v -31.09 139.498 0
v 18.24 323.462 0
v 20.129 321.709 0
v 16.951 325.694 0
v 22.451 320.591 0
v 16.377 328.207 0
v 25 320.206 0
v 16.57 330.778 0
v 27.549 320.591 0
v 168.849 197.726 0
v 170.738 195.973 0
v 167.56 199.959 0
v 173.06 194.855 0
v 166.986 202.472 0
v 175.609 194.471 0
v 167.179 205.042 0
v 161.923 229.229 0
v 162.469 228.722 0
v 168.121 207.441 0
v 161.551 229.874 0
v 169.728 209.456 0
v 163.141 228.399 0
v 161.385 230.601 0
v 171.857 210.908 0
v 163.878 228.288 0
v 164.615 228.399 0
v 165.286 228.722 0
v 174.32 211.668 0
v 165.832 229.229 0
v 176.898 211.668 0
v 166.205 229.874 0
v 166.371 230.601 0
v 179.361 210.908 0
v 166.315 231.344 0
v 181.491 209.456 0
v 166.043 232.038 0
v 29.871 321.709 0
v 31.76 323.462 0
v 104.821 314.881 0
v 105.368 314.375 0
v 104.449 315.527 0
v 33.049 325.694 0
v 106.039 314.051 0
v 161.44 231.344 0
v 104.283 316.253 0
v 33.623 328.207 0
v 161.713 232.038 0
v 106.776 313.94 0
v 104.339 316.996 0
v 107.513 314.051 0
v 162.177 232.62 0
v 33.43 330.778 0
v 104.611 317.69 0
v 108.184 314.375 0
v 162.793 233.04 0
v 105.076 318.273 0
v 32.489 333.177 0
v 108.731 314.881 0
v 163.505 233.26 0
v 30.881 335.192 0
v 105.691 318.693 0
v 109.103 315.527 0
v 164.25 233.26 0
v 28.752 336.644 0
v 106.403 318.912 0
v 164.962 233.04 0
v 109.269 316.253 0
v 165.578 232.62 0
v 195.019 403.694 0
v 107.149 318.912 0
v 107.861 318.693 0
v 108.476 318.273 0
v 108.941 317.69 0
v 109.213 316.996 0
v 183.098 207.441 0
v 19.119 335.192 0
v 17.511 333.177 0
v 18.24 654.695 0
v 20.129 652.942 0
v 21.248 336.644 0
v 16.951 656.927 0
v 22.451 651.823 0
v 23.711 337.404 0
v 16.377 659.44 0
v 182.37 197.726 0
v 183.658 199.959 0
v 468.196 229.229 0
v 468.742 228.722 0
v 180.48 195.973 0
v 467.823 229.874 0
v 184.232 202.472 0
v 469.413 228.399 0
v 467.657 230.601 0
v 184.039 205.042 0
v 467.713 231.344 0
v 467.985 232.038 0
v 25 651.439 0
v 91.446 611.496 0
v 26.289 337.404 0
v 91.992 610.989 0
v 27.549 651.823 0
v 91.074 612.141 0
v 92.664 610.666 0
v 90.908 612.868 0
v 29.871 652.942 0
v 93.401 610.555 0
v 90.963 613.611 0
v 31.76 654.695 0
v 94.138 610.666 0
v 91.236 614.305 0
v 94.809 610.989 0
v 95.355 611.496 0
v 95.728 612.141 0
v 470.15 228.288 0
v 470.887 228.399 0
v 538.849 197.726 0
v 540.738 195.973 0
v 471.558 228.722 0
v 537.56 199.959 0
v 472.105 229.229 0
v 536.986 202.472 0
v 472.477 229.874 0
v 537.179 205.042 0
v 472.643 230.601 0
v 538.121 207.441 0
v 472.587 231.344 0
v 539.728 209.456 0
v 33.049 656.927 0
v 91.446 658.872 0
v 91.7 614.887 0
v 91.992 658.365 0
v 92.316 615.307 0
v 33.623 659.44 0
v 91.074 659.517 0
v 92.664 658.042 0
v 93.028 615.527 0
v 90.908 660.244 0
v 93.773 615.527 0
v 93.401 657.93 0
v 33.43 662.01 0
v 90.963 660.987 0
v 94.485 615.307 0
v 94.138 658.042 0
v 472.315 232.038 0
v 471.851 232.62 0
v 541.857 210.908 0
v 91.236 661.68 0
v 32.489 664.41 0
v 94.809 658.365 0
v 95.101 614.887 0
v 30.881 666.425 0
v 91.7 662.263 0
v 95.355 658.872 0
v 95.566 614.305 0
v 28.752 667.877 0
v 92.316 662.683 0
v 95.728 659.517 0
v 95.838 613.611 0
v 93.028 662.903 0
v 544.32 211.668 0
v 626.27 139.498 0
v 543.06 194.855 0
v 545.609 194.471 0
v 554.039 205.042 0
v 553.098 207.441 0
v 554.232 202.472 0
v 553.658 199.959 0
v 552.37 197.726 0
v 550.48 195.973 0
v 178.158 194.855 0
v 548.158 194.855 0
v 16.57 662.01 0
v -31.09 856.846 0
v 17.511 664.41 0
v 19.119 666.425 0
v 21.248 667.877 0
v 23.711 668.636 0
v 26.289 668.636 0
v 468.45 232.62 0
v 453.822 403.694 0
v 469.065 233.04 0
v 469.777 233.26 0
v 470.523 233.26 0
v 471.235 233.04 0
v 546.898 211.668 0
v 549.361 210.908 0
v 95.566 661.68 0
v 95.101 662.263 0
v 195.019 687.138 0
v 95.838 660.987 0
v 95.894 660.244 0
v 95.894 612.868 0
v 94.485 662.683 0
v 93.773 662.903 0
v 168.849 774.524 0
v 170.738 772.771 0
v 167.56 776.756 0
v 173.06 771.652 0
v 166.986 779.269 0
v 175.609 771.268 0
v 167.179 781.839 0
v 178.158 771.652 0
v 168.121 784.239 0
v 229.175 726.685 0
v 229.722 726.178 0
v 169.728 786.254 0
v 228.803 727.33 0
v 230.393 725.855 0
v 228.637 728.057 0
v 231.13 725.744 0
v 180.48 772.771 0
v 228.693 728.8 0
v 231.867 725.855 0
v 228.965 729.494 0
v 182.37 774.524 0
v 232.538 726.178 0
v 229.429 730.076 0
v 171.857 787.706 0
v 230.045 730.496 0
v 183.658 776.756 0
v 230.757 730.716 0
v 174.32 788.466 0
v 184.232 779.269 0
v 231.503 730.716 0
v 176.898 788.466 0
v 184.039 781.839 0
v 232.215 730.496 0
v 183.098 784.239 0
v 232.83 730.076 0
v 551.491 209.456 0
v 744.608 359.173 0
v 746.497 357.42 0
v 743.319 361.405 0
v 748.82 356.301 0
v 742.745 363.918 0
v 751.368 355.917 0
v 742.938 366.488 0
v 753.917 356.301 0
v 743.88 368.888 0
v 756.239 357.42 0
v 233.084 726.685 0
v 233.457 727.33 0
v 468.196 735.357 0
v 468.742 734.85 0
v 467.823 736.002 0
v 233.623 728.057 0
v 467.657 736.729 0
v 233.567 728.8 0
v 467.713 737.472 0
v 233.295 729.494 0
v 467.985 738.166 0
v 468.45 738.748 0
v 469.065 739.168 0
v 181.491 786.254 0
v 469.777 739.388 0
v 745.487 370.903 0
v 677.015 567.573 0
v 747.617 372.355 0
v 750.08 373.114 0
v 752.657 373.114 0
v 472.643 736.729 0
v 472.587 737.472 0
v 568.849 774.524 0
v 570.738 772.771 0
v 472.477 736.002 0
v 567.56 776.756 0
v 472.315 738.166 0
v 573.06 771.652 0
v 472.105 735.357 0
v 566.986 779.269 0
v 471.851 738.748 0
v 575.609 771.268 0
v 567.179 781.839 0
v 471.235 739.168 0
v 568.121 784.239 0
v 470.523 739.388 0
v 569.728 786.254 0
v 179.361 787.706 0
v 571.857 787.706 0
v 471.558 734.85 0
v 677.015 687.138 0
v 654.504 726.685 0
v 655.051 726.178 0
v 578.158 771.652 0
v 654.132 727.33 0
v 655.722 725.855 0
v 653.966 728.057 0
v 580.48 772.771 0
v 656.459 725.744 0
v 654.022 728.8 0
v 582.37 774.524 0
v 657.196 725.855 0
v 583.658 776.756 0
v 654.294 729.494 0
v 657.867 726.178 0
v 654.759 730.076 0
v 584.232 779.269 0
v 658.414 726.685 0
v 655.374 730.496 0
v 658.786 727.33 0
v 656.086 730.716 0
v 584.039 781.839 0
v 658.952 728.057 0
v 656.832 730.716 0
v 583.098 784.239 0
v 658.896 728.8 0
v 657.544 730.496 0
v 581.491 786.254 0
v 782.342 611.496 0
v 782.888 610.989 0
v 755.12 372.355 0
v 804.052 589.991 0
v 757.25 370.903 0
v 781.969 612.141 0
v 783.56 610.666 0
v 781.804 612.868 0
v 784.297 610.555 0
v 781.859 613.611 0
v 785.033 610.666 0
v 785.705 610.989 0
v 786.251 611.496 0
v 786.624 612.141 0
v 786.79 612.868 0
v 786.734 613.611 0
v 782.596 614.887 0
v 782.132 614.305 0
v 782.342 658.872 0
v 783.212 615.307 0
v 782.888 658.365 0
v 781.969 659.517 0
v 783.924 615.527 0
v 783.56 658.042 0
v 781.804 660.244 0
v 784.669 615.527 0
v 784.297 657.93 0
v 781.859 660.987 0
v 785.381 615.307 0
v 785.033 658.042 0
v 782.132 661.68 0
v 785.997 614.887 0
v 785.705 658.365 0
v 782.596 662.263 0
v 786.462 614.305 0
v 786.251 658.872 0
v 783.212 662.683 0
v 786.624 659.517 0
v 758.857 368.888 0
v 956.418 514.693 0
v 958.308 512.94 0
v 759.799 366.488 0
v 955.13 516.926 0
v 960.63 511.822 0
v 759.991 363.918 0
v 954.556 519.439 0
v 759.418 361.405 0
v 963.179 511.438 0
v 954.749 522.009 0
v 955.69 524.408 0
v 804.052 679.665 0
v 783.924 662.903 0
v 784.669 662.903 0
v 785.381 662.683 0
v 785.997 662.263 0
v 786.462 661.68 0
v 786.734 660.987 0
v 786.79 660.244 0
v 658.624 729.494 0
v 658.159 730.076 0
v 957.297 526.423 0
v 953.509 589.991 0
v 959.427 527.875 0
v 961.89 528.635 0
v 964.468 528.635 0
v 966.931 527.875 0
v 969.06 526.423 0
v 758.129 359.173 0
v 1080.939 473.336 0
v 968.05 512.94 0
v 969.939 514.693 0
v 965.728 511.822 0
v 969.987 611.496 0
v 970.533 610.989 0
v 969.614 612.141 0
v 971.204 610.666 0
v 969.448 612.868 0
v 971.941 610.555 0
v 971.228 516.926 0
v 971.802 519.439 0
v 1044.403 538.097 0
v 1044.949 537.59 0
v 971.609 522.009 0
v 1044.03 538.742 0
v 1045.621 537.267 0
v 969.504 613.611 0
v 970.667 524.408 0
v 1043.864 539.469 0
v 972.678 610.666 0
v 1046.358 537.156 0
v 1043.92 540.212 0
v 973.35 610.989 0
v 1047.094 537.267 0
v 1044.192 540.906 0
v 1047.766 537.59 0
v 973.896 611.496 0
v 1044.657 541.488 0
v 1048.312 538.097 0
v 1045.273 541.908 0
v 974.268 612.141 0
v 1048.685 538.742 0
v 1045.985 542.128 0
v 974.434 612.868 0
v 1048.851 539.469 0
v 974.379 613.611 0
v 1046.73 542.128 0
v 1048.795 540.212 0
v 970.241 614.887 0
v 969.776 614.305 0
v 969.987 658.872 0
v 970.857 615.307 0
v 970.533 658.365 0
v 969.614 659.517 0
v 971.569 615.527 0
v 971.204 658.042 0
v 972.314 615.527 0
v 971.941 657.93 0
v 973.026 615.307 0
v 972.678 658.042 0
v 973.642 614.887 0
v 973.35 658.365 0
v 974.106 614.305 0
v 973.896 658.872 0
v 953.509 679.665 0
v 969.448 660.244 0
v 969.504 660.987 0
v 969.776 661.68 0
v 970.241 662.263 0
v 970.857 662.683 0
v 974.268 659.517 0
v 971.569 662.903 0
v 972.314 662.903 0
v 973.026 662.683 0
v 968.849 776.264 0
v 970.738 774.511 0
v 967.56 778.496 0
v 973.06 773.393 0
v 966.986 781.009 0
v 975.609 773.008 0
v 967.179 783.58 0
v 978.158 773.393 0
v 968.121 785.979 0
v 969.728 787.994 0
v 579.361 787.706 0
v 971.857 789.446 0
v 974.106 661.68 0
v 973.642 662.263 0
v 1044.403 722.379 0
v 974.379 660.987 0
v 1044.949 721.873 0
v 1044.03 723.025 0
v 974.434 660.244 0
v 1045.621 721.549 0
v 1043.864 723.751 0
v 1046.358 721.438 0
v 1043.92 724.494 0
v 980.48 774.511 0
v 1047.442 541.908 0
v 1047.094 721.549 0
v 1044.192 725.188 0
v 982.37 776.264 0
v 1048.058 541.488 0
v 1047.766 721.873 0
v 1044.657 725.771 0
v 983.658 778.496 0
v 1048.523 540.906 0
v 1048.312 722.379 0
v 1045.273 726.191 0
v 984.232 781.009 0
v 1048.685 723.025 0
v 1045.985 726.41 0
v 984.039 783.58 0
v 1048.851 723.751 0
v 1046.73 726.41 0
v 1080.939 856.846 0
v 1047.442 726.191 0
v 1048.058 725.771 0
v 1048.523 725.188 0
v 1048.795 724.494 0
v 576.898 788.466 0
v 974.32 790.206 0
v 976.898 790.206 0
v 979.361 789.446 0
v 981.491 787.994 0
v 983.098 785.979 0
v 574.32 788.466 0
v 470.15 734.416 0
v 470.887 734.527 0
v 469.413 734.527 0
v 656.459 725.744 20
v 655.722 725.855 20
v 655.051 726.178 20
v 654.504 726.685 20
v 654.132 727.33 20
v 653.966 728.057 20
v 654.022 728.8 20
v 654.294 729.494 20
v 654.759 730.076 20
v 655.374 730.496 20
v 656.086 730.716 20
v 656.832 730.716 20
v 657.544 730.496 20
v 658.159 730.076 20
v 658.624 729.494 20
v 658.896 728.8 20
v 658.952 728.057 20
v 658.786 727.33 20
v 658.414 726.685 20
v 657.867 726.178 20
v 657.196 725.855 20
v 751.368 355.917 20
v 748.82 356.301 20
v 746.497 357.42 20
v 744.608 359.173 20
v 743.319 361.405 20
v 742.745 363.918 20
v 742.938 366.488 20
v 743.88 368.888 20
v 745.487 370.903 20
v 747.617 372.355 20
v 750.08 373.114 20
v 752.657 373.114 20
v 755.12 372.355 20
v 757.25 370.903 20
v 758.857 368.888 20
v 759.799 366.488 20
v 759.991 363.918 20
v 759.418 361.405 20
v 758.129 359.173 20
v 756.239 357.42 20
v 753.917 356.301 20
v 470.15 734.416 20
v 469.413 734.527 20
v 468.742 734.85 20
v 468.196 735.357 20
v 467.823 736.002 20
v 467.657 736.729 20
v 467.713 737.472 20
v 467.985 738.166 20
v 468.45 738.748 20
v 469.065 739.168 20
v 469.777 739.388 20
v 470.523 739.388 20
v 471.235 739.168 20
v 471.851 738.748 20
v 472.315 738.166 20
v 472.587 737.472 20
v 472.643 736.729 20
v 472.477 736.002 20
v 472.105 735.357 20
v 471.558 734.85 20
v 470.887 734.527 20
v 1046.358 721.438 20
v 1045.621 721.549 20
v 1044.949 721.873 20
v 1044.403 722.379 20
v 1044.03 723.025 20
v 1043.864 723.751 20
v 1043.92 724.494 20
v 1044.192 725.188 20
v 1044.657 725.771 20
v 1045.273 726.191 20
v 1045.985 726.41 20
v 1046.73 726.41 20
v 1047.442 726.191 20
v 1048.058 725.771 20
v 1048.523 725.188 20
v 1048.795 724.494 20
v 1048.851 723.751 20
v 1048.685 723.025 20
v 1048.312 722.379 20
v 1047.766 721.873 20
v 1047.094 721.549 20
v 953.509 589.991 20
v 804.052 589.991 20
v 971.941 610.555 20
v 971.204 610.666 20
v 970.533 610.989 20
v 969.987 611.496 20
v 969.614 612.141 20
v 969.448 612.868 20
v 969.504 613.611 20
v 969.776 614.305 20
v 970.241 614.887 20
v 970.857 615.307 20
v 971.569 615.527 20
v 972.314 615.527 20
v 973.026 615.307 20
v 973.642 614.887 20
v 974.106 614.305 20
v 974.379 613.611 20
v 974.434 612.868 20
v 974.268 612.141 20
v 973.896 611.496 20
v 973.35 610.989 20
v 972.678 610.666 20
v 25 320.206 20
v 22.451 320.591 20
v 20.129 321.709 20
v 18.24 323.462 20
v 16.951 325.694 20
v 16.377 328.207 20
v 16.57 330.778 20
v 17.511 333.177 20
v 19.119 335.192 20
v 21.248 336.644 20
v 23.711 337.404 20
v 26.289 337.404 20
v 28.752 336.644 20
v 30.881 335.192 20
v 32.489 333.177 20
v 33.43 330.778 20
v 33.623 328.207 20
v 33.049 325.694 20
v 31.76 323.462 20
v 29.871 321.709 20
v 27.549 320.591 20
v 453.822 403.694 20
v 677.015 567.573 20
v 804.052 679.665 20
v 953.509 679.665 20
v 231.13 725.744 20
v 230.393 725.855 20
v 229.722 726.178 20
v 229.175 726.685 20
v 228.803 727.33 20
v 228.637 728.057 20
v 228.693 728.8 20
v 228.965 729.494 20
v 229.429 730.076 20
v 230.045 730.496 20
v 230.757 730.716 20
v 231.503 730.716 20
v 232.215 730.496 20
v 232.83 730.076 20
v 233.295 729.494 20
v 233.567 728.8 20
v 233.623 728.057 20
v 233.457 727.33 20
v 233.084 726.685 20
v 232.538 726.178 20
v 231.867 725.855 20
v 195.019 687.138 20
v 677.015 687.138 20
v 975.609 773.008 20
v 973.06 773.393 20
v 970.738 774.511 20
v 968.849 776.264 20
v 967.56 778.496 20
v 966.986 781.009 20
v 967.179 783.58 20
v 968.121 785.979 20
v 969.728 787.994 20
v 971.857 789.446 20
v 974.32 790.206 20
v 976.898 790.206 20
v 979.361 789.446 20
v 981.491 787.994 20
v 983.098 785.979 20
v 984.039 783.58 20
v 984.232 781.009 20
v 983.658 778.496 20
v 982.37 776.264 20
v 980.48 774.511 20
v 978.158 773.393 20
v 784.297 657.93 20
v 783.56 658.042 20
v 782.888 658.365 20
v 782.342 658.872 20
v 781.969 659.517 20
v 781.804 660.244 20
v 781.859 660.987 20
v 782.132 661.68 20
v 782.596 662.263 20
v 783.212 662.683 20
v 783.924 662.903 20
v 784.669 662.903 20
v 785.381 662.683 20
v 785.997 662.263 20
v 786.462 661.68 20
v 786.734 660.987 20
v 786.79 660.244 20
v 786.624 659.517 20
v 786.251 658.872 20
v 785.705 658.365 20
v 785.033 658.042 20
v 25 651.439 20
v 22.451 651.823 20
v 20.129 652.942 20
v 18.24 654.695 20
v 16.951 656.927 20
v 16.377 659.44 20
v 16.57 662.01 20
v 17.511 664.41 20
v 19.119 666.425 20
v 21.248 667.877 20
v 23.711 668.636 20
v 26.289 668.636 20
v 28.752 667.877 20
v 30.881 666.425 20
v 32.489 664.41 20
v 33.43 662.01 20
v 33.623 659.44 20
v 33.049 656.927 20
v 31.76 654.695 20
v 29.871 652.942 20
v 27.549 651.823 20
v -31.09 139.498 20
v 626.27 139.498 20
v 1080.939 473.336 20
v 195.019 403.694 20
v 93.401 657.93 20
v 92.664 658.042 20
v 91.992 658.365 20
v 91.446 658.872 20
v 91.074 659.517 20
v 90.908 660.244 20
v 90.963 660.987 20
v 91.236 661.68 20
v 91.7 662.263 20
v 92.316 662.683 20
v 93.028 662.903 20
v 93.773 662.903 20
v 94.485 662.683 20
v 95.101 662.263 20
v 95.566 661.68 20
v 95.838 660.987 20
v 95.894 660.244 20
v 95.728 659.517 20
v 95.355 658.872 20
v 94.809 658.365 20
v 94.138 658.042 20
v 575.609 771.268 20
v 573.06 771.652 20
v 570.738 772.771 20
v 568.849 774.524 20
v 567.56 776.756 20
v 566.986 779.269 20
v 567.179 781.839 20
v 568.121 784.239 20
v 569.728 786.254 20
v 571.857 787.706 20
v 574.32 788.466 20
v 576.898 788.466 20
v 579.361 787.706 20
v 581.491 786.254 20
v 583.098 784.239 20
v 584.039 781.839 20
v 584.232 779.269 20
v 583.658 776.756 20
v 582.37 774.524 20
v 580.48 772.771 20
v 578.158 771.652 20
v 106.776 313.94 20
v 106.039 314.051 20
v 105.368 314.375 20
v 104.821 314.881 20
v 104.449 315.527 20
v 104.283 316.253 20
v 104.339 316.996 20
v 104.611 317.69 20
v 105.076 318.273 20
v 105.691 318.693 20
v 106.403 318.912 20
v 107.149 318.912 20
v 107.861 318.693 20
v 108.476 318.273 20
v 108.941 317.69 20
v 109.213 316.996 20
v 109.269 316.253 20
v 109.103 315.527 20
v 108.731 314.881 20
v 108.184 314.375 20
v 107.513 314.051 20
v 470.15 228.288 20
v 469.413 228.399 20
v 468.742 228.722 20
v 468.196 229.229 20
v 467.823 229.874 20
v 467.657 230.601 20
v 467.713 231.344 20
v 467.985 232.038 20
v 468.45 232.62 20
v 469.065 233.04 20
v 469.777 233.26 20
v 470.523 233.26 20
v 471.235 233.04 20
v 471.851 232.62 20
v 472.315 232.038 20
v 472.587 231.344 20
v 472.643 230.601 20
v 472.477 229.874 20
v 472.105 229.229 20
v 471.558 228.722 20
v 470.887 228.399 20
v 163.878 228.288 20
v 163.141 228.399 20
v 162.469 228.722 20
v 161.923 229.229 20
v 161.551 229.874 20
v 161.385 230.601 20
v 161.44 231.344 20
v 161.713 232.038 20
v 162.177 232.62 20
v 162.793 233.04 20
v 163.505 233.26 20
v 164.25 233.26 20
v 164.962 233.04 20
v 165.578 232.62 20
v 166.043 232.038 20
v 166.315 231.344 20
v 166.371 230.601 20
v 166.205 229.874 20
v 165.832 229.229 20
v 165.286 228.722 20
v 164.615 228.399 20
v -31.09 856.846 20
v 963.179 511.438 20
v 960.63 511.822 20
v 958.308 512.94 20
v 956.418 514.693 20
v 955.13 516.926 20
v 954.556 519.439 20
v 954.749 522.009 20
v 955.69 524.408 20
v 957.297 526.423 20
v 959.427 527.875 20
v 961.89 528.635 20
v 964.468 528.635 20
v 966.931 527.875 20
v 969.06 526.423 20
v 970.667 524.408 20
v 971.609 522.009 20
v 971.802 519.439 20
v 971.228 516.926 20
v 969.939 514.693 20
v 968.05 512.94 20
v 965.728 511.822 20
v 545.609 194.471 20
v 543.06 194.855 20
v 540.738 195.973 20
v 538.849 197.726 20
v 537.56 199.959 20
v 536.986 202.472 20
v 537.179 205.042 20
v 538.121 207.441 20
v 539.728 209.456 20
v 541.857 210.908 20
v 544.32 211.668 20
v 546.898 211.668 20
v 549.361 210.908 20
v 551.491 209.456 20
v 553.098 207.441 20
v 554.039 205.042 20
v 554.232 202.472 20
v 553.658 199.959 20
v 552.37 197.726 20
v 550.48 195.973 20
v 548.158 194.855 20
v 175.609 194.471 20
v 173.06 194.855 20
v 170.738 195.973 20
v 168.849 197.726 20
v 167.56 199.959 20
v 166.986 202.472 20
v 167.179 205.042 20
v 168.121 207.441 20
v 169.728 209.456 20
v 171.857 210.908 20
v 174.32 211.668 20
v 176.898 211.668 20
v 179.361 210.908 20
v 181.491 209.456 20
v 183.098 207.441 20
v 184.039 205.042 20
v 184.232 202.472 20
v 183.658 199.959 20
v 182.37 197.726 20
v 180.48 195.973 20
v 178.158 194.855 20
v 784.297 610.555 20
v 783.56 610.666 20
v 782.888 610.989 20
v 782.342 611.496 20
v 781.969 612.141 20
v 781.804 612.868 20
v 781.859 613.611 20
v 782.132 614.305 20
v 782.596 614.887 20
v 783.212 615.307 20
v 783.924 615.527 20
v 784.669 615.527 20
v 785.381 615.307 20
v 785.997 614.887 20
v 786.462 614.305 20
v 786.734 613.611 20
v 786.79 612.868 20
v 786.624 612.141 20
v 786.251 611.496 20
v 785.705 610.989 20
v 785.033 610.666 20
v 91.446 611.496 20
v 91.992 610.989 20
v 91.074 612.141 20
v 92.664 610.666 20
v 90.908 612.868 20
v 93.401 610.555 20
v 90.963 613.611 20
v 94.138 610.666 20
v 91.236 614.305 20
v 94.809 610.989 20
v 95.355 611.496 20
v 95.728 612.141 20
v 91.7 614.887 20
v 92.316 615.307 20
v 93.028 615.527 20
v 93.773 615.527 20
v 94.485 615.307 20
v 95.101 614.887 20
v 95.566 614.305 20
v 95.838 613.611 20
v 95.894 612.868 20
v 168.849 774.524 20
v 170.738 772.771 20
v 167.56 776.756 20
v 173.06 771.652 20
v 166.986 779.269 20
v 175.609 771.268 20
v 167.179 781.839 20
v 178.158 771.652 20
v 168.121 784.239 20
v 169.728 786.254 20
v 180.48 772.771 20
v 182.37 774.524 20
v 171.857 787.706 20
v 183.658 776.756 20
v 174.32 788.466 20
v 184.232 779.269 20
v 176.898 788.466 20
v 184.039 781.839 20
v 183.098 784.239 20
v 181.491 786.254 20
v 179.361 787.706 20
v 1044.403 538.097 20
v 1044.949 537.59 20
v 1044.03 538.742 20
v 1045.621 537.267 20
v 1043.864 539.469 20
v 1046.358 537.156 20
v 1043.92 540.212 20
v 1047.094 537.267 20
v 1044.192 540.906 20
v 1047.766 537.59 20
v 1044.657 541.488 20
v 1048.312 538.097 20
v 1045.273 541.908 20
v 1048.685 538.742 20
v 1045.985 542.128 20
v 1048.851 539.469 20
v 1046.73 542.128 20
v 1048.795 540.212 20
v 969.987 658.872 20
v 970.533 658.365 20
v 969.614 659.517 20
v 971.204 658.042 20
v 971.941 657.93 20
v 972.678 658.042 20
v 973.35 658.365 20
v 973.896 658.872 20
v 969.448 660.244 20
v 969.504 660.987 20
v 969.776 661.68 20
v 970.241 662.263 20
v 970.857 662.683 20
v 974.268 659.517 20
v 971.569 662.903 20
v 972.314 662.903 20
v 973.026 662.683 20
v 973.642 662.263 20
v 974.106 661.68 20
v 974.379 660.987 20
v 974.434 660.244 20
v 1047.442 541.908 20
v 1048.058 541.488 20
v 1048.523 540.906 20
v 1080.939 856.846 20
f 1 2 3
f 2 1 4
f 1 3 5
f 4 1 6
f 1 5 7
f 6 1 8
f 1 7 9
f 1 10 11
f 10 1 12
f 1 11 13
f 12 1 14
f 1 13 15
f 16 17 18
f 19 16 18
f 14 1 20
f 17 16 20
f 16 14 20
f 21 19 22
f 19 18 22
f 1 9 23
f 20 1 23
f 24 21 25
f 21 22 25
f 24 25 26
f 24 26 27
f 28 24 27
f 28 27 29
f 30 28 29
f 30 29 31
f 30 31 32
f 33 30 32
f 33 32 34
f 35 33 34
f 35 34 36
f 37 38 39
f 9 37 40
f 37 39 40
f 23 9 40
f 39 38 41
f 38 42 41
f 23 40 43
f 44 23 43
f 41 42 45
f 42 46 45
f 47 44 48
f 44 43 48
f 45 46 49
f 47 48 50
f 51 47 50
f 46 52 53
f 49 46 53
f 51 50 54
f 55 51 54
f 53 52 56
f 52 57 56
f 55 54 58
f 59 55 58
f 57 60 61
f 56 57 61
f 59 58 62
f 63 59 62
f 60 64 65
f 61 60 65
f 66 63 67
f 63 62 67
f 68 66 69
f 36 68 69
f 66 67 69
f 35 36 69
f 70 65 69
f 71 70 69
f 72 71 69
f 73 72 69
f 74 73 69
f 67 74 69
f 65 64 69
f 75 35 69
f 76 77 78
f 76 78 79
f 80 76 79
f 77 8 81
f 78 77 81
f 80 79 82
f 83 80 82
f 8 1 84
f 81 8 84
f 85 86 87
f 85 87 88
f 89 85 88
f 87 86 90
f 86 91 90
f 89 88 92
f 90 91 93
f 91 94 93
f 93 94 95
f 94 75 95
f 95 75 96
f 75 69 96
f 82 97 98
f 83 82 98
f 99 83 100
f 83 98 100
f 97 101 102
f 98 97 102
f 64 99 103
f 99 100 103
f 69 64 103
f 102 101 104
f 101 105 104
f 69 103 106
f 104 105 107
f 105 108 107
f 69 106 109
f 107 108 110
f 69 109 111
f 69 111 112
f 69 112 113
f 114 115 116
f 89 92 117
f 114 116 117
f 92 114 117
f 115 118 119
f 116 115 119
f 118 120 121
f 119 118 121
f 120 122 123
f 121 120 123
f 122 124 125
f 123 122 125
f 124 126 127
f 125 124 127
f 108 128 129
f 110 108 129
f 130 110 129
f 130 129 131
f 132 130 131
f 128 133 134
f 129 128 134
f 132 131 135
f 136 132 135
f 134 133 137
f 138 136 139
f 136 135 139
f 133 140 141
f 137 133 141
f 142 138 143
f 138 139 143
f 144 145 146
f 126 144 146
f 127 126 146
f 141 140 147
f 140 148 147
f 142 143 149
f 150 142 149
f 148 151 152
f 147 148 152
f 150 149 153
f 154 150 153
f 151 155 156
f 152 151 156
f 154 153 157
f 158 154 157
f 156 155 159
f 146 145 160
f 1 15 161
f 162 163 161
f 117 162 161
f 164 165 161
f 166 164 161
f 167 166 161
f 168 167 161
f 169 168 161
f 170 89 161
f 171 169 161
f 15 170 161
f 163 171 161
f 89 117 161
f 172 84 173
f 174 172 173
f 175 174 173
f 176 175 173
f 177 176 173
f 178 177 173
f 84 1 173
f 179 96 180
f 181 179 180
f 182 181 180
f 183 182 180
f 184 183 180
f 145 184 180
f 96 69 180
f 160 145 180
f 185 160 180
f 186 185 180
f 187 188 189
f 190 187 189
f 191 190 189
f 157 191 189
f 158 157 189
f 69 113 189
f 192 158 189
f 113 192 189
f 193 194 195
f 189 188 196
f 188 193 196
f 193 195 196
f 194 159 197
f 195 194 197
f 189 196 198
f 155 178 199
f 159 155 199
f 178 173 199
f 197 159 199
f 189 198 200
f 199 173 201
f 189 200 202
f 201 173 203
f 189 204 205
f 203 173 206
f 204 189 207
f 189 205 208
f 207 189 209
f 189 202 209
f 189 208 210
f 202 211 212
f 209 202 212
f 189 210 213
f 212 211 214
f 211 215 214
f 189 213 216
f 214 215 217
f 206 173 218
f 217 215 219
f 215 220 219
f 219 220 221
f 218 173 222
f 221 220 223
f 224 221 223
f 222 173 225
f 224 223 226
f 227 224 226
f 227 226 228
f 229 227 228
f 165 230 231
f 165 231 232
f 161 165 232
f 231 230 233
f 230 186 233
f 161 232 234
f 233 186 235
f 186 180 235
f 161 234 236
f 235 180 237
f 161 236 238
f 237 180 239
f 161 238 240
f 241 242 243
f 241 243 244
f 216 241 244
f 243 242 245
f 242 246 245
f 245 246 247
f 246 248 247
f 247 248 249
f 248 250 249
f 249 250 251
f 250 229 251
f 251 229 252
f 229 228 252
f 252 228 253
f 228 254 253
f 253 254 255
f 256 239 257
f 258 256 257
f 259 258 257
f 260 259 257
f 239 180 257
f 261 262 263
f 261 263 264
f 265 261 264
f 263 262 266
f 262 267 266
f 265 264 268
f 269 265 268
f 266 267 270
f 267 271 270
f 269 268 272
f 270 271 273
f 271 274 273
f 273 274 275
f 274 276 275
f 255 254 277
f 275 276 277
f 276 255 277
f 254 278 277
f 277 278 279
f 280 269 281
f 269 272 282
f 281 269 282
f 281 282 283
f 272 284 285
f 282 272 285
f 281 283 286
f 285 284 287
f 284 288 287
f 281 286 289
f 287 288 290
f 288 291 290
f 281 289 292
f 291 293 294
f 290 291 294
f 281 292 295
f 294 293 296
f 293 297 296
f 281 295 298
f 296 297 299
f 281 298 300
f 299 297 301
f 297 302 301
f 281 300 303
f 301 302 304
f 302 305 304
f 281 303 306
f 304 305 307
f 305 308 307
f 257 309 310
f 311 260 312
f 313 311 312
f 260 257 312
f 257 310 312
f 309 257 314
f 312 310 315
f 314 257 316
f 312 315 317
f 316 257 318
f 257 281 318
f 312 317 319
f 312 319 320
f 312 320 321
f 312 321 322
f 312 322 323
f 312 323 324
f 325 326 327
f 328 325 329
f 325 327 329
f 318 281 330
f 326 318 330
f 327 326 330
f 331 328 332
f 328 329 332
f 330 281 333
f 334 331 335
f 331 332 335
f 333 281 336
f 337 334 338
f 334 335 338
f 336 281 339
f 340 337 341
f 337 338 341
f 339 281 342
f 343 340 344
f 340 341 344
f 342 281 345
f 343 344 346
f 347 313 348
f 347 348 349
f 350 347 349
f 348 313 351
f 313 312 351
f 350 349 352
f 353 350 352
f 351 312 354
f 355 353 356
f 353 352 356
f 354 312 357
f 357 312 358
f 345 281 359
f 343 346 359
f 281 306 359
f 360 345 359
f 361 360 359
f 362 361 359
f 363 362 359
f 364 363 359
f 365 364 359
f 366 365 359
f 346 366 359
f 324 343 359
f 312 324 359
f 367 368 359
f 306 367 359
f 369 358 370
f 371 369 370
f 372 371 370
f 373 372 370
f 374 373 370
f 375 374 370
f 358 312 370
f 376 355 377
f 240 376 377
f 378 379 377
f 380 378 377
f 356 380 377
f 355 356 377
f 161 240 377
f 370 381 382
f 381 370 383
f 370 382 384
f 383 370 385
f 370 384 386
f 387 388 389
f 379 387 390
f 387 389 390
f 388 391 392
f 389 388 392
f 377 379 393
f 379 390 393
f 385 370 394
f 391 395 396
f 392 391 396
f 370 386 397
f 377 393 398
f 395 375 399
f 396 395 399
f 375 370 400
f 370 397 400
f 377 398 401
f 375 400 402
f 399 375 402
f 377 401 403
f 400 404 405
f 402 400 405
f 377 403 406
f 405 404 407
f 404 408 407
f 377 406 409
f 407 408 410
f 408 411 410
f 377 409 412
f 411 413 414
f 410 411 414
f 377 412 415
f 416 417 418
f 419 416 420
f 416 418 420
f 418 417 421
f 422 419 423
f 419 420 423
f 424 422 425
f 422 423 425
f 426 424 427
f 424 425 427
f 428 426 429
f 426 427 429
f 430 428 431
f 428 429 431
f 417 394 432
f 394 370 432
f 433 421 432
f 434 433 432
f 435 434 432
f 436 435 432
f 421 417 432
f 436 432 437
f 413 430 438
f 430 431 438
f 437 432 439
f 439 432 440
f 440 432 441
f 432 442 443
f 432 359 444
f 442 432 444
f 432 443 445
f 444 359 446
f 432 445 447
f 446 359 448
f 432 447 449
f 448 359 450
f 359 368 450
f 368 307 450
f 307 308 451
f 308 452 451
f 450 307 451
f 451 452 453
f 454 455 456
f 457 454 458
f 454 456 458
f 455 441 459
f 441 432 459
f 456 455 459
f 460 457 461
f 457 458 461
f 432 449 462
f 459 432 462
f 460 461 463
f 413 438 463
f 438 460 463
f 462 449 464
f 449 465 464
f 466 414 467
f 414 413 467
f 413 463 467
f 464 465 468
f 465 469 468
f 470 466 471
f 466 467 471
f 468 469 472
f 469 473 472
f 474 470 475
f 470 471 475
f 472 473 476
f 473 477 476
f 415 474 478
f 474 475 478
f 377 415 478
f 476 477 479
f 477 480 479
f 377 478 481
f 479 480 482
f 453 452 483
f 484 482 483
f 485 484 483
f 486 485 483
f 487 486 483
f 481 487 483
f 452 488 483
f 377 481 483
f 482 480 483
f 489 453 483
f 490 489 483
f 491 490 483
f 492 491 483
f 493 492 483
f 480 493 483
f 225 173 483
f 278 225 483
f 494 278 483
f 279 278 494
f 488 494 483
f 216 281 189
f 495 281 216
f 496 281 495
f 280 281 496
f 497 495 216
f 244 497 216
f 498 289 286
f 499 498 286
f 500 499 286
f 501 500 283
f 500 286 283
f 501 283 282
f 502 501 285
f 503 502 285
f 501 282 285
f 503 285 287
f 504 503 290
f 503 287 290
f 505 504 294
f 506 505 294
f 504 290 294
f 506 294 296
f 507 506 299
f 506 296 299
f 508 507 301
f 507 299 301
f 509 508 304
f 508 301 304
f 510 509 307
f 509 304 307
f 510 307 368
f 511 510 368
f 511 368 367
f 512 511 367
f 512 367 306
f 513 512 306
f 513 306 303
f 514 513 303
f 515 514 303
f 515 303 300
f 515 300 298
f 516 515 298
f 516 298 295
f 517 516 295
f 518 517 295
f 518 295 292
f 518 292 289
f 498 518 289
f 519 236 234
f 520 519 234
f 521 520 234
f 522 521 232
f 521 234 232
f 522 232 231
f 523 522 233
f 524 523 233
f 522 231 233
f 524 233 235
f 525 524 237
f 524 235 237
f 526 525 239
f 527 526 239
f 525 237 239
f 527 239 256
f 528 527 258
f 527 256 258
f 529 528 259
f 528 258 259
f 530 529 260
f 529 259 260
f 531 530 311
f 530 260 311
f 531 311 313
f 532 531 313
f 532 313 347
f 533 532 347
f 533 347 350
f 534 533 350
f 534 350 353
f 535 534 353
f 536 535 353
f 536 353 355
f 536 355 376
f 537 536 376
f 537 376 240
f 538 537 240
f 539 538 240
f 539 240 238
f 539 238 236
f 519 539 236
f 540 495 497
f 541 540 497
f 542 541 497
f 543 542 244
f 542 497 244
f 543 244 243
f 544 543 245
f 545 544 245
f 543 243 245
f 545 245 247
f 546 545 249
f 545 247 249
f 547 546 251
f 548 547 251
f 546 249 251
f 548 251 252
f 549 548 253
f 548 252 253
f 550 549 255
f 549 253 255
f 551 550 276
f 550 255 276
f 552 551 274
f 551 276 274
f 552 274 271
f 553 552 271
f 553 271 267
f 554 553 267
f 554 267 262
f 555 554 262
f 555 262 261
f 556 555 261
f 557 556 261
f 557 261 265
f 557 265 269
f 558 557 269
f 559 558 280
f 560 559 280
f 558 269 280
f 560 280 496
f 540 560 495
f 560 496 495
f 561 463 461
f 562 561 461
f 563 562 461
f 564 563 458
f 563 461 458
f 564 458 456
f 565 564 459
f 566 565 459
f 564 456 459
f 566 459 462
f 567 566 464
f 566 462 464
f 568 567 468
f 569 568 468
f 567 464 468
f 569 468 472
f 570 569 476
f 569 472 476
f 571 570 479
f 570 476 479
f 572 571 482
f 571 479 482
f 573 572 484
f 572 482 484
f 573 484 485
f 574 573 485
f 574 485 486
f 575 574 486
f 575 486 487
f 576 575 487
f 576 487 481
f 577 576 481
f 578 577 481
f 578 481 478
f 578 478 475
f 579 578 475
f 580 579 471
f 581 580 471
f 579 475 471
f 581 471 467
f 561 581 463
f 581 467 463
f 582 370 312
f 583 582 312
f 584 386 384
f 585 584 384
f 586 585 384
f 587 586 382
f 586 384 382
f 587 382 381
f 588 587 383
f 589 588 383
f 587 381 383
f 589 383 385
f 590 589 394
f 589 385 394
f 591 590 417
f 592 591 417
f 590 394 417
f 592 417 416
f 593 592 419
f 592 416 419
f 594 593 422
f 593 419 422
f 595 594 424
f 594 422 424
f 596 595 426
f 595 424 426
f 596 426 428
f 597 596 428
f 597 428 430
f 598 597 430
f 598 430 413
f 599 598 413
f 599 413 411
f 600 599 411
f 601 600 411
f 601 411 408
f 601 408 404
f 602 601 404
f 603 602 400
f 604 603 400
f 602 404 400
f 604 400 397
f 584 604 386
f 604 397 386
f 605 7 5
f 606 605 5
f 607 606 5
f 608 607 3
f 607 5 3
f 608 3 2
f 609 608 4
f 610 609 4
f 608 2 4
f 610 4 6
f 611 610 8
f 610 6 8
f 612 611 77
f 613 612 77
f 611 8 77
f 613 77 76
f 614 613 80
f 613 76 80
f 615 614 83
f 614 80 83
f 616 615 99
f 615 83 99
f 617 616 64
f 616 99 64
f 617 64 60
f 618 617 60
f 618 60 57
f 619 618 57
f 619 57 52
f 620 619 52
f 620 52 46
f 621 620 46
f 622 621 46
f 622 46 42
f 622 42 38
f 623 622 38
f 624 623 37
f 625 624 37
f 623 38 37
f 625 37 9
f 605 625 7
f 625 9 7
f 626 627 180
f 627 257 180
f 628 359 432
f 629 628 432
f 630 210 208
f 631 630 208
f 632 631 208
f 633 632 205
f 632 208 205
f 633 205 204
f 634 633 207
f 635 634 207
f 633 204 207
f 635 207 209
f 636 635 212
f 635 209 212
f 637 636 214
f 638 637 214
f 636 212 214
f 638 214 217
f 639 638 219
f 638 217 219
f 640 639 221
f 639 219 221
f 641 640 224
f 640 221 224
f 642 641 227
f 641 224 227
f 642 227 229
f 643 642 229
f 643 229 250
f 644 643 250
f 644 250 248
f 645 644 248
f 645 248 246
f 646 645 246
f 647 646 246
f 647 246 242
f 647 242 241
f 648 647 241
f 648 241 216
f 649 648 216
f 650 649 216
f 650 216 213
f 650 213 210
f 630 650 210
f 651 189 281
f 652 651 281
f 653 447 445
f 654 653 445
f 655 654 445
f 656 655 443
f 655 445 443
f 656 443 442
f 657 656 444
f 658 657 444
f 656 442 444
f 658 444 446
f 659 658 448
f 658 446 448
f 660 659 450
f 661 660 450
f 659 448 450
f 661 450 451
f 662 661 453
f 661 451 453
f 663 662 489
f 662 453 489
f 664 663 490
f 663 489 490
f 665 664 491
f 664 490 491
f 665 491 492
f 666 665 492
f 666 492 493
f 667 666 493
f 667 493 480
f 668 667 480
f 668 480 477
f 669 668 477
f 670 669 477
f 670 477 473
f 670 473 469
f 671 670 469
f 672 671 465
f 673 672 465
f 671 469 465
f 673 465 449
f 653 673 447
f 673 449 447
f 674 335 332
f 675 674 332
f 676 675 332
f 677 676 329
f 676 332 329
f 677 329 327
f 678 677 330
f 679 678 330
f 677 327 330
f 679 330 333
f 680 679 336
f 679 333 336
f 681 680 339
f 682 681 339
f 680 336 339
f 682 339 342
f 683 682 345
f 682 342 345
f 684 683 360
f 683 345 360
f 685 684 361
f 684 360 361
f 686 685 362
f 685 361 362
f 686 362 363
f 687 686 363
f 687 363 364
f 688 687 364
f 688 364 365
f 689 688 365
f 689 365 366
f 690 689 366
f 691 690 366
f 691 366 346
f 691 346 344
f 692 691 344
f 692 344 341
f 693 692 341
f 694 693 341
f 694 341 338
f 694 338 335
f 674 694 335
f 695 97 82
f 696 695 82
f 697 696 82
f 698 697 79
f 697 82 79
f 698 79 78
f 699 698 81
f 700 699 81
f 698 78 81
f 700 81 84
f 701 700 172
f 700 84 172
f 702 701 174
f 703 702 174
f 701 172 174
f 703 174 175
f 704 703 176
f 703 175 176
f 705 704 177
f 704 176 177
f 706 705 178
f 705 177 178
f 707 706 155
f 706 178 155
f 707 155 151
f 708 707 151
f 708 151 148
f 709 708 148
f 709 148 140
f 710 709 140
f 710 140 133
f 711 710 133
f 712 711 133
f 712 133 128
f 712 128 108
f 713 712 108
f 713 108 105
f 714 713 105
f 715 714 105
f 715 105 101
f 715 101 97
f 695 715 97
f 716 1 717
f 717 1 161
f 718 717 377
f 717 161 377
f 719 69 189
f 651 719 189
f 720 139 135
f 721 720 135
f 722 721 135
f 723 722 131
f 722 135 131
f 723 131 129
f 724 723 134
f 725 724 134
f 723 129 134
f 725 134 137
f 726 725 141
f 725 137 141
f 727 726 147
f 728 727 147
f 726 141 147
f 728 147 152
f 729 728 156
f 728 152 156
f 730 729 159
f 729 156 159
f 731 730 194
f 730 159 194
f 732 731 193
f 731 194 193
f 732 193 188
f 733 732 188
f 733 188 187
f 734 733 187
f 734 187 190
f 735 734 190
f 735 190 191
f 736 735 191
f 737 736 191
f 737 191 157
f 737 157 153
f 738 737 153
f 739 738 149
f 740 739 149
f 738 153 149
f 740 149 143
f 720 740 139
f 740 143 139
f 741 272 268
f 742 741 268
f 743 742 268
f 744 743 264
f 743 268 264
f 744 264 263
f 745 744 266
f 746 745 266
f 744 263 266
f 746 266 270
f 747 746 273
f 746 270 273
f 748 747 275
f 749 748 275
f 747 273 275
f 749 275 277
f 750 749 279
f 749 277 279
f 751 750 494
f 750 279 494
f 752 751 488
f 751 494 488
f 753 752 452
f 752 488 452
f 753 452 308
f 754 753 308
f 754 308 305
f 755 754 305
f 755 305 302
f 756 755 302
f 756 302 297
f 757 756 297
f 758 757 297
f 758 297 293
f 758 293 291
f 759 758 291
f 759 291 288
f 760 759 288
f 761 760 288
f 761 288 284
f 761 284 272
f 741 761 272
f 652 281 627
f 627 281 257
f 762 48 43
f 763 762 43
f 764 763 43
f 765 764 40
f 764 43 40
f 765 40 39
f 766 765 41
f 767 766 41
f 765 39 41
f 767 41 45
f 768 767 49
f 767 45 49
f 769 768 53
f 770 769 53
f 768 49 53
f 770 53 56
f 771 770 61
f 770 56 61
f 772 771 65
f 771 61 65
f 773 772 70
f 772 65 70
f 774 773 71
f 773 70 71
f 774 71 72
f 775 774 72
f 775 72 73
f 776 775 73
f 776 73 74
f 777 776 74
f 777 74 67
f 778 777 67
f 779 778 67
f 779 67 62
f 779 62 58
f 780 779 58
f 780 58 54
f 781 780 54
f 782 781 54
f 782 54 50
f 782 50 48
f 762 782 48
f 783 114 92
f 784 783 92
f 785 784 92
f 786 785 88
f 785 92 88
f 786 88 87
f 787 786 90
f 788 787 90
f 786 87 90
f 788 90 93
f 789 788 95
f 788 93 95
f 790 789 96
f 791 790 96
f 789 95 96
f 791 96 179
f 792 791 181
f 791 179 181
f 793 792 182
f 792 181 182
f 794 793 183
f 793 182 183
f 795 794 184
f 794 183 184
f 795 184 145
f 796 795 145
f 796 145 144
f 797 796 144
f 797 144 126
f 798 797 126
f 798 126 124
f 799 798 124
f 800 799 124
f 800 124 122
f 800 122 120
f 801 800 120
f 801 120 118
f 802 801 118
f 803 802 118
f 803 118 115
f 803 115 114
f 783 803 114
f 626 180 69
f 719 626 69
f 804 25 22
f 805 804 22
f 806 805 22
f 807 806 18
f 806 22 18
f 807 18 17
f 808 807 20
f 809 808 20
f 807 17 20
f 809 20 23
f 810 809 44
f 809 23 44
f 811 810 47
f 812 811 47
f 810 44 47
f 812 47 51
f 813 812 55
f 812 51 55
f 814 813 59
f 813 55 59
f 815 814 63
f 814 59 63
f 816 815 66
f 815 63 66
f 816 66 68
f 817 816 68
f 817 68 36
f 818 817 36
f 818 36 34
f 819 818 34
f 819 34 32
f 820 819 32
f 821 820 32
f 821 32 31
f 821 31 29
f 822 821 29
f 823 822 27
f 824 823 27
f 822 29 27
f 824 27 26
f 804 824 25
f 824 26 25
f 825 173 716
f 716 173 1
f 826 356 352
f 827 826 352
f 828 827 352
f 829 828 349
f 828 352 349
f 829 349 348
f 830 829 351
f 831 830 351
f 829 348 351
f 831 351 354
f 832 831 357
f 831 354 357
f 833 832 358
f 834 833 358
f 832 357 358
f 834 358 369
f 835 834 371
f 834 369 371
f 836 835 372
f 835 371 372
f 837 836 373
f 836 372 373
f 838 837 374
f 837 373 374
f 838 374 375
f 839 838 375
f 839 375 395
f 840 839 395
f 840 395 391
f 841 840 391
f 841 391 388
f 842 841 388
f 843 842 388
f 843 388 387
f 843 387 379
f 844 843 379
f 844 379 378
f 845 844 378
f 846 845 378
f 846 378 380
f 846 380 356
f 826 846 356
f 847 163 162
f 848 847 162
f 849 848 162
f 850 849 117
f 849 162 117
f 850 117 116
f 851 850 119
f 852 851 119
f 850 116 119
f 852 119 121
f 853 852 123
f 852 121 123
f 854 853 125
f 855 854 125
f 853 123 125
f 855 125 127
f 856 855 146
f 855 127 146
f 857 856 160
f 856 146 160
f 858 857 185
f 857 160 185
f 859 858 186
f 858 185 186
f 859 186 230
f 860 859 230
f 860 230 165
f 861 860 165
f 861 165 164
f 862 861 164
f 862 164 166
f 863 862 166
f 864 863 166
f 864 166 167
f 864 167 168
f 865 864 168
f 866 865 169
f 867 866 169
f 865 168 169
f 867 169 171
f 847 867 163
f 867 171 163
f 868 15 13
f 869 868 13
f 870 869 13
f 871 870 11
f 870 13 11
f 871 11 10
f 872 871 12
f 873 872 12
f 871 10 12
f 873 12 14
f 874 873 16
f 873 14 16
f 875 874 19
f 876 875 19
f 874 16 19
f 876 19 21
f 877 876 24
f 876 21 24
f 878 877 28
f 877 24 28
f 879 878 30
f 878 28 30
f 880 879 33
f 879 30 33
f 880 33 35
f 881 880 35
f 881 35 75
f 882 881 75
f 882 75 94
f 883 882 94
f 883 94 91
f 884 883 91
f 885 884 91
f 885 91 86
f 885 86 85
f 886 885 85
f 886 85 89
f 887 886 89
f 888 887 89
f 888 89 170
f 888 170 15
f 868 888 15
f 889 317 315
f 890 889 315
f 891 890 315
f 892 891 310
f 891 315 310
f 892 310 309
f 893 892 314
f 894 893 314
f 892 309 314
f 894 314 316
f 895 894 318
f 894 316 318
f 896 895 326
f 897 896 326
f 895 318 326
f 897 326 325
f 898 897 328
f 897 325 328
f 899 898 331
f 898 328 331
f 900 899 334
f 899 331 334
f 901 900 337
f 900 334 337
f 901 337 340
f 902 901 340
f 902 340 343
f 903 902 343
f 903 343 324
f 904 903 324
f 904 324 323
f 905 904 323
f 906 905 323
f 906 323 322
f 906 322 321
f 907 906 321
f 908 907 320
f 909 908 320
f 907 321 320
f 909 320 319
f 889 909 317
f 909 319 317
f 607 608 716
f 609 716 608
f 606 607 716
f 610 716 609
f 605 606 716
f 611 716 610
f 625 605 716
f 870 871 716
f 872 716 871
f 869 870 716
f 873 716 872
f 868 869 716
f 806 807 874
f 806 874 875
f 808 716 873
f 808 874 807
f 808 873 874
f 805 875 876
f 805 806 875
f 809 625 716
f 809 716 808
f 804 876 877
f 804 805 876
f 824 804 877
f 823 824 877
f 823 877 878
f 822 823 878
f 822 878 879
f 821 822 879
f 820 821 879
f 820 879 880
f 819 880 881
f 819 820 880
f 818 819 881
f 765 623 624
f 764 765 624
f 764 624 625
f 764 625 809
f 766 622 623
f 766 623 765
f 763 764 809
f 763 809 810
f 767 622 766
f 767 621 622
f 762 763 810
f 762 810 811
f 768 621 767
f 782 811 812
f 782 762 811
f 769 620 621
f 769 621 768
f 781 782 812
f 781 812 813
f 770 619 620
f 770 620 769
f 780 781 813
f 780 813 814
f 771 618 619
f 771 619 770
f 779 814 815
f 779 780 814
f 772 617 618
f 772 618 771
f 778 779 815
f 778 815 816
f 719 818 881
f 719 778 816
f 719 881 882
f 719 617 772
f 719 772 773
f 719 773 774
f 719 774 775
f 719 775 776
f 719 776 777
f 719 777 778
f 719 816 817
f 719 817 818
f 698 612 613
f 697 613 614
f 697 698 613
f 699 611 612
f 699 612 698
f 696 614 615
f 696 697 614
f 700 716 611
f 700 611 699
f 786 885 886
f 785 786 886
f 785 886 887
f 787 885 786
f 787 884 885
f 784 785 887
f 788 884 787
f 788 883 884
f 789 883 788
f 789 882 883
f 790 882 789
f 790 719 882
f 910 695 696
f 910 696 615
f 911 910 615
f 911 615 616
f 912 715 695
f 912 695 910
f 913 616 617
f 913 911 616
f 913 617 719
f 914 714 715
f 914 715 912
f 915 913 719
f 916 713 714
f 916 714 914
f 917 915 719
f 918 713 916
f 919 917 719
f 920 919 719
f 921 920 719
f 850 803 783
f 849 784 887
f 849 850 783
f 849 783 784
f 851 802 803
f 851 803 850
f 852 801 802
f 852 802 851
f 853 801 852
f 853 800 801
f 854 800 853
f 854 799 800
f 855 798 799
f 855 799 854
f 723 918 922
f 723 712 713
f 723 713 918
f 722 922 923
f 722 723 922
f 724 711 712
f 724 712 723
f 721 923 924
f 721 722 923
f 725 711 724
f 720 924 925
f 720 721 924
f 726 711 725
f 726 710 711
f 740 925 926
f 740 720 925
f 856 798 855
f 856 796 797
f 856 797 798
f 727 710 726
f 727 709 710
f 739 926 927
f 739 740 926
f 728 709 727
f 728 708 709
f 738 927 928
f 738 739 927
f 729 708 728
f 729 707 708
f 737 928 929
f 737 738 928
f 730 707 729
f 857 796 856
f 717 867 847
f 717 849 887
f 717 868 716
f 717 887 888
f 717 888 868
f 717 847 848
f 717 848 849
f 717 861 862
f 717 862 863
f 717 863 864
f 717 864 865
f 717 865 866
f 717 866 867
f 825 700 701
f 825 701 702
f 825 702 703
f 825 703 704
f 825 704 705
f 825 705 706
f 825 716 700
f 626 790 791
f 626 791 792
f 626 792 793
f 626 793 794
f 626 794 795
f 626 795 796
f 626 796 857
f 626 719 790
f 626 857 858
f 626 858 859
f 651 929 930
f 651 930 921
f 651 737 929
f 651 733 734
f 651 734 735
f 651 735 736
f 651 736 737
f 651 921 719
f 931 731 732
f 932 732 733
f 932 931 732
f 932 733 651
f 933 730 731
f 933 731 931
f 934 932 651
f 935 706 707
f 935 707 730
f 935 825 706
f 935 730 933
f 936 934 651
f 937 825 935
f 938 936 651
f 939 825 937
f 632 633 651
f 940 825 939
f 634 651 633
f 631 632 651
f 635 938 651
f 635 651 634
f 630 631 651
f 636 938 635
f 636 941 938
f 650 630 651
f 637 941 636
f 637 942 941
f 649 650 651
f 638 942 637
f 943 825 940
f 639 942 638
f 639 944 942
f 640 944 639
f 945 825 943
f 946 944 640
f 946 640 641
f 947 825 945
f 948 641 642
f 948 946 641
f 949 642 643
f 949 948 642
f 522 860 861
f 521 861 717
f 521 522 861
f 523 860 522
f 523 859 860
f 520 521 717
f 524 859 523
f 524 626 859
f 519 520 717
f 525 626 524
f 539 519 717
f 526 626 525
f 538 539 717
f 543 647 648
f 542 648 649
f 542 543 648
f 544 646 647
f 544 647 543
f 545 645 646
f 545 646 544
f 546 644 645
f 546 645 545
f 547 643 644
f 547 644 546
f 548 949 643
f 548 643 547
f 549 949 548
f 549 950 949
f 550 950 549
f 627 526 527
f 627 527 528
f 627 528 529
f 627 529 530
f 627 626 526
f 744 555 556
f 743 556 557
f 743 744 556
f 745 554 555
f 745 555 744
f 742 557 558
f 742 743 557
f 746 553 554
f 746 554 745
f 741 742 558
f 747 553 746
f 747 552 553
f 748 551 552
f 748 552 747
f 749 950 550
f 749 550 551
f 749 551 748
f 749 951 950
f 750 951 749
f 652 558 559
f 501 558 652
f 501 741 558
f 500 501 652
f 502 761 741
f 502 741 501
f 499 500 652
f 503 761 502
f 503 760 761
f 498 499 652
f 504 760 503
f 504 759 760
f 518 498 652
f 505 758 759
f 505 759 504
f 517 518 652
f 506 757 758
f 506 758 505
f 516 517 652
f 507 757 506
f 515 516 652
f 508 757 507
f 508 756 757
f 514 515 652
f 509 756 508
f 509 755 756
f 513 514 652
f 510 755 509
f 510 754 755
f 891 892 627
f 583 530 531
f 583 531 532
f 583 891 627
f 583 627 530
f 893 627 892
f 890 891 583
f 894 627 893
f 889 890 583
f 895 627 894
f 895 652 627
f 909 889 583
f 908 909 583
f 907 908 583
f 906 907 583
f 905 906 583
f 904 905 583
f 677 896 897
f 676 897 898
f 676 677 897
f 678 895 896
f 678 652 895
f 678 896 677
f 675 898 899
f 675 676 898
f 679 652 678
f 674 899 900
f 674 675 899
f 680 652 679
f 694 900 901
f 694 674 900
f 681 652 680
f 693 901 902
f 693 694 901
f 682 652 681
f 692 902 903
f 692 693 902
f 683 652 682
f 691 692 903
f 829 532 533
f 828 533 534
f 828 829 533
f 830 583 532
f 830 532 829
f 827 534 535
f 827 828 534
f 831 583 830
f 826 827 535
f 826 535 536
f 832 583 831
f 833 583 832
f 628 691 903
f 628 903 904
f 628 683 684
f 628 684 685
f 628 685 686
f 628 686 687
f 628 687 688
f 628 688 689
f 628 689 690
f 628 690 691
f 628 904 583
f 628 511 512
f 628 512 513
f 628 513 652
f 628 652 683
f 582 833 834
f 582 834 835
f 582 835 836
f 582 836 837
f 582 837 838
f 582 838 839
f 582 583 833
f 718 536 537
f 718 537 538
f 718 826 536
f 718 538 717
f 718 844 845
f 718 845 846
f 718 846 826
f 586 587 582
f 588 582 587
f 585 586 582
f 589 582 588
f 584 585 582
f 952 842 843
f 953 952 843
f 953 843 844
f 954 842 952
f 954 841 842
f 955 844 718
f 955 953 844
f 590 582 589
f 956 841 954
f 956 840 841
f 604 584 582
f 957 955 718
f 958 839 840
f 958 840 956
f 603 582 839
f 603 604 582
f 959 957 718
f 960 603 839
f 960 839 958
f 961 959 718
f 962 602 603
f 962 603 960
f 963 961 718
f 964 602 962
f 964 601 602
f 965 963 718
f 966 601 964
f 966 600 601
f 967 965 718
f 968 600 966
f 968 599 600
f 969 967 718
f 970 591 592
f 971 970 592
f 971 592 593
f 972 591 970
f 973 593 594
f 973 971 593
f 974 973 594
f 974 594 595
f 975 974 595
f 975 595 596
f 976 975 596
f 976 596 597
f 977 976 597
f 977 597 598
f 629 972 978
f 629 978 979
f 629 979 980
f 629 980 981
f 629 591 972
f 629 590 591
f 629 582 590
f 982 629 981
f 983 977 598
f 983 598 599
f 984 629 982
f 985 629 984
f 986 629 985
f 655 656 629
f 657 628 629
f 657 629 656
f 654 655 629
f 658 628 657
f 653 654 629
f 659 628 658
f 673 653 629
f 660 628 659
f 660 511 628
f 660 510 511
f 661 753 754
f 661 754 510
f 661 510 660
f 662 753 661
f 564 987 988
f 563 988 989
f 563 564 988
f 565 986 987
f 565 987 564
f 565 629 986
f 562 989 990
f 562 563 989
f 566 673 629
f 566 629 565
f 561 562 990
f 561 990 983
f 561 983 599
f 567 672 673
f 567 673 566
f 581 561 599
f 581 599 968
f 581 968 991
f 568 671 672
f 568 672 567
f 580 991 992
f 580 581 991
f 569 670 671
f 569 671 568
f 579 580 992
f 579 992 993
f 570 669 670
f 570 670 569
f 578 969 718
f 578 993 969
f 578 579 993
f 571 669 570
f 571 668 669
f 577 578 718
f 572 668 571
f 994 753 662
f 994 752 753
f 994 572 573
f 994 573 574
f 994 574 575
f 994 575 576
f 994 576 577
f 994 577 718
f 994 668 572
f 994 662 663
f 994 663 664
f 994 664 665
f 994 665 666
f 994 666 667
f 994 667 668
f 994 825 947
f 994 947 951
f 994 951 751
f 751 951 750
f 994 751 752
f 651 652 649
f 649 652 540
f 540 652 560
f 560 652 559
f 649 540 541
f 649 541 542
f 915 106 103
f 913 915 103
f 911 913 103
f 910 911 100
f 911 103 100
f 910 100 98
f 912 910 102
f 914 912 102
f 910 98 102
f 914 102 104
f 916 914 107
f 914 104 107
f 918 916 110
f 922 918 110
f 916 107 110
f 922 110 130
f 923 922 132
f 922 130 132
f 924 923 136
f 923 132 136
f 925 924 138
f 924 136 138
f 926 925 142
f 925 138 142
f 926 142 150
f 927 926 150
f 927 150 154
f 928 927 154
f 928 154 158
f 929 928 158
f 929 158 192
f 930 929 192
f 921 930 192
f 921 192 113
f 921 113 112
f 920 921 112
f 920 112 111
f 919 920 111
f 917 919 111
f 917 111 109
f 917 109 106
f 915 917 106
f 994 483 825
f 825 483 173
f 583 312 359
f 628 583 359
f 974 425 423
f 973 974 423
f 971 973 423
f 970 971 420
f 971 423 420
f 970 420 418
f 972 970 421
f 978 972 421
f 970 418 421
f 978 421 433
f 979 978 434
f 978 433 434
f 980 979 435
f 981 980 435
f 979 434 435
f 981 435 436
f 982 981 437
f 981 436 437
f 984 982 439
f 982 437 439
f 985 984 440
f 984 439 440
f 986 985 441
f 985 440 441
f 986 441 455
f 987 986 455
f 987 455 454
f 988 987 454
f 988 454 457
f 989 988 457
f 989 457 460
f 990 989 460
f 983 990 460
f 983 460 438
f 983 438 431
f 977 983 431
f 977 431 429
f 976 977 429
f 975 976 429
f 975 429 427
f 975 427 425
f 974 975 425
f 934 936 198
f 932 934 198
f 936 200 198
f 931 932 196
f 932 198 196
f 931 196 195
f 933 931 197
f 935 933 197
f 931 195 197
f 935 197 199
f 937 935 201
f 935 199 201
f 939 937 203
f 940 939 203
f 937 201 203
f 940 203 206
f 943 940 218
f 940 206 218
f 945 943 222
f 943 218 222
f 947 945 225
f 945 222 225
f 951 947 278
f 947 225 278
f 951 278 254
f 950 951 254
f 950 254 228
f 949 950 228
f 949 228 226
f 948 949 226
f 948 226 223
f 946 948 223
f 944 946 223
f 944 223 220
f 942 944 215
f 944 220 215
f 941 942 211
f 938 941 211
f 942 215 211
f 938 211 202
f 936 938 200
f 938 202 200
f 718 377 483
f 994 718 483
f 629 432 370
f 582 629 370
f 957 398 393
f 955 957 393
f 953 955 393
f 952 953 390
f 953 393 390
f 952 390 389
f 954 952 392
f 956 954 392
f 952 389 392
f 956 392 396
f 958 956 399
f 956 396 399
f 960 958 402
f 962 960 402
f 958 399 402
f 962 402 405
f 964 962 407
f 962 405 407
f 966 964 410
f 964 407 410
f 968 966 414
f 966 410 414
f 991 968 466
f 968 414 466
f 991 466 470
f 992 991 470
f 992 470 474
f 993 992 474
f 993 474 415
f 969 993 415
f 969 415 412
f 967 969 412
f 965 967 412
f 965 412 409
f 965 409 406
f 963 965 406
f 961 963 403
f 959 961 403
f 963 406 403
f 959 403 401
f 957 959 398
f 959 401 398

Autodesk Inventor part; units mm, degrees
ref_plane "YZ Plane" through (0, 0, 0) normal (1, 0, 0) x (0, 1, 0)
ref_plane "XZ Plane" through (0, 0, 0) normal (0, 1, 0) x (-1, 0, 0)
ref_plane "XY Plane" through (0, 0, 0) normal (0, 0, 1) x (1, 0, 0)
sketch "Sketch1" plane through (0, 0, 0) normal (0, 0, 1) x (1, 0, 0)
  line L0 (1080.9387, 856.8456) -> (-31.0901, 856.8456)
  line L1 (-31.0901, 856.8456) -> (-31.0901, 139.4979)
  line L2 (-31.0901, 139.4979) -> (626.2703, 139.4979)
  line L3 (626.2703, 139.4979) -> (1080.9387, 473.3358)
  line L4 (1080.9387, 473.3358) -> (1080.9387, 856.8456)
  line L5 (963.1788, 520.0847) -> (751.3683, 364.564) construction
  line L6 (195.0188, 687.1378) -> (677.0148, 687.1378)
  line L7 (677.0148, 687.1378) -> (677.0148, 567.5728)
  line L8 (677.0148, 567.5728) -> (453.8217, 403.6944)
  line L9 (453.8217, 403.6944) -> (195.0188, 403.6944)
  line L10 (195.0188, 403.6944) -> (195.0188, 687.1378)
  line L11 (804.0525, 679.6649) -> (953.5087, 679.6649)
  line L12 (953.5087, 679.6649) -> (953.5087, 589.9913)
  line L13 (953.5087, 589.9913) -> (804.0525, 589.9913)
  line L14 (804.0525, 589.9913) -> (804.0525, 679.6649)
  point P0 (175.6092, 779.9153)
  point P1 (575.6092, 779.9153)
  point P2 (975.6092, 781.6554)
  point P3 (545.6092, 203.1178)
  point P4 (175.6092, 203.1178)
  point P5 (25, 660.086)
  point P6 (25, 328.8534)
  dimension "d1" = 400
  dimension "d2" = 400
  dimension "d3" = 370
extrude "Extrusion1" add sketch "Sketch1" along normal blind 20
sketch "Sketch2" plane through (0, 0, 20) normal (0, 0, 1) x (1, 0, 0)
  point P0 (784.2966, 660.4305)
  point P1 (784.2966, 613.0548)
  point P2 (971.9413, 613.0548)
  point P3 (971.9413, 660.4305)
  point P4 (93.4007, 660.4305)
  point P5 (93.4007, 613.0548)
  point P6 (470.1501, 736.9158)
  point P7 (1046.3575, 723.9381)
  point P8 (1046.3575, 539.6556)
  point P9 (470.1501, 230.7876)
  point P10 (163.8777, 230.7876)
  point P11 (106.776, 316.4401)
  point P12 (656.459, 728.2437)
  point P13 (231.1299, 728.2437)
hole "Hole1" at (784.2966, 660.4305, 20) at (784.2966, 613.0548, 20) at (971.9413, 613.0548, 20) at (971.9413, 660.4305, 20) at (93.4007, 660.4305, 20) at (93.4007, 613.0548, 20) at (470.1501, 736.9158, 20) at (1046.3575, 723.9381, 20) at (1046.3575, 539.6556, 20) at (470.1501, 230.7876, 20) at (163.8777, 230.7876, 20) at (106.776, 316.4401, 20) at (231.1299, 728.2437, 20) at (656.459, 728.2437, 20) direction (0, 0, -1) diameter 5 end through all
sketch "Sketch3" plane through (0, 0, 20) normal (0, 0, 1) x (1, 0, 0)
  line L0 (-31.0901, 139.4979) -> (626.2703, 139.4979)
  line L1 (626.2703, 139.4979) -> (1080.9387, 473.3358)
  line L2 (1080.9387, 473.3358) -> (1080.9387, 856.8456)
  line L3 (963.1788, 520.0847) -> (751.3683, 364.564) construction
  point P0 (175.6092, 779.9153)
  point P1 (575.6092, 779.9153)
  point P2 (975.6092, 781.6554)
  point P3 (545.6092, 203.1178)
  point P4 (175.6092, 203.1178)
  point P5 (25, 660.086)
  point P6 (25, 328.8534)
  dimension "d18" = 400
  dimension "d19" = 400
  dimension "d20" = 370
hole "Hole2" at (25, 328.8534, 20) at (25, 660.086, 20) at (175.6092, 779.9153, 20) at (575.6092, 779.9153, 20) at (975.6092, 781.6554, 20) at (963.1788, 520.0847, 20) at (751.3683, 364.564, 20) at (545.6092, 203.1178, 20) at (175.6092, 203.1178, 20) direction (0, 0, -1) diameter 17.294 end through all
ref_plane "Work Plane1" through (231.1299, 728.2437, 20) normal (1, 0, 0) x (0, 0, -1)
ref_plane "Work Plane2" through (470.1501, 736.9158, -1303.4787) normal (1, 0, 0) x (0, 0, 1)
ref_plane "Work Plane3" through (656.459, 728.2437, 20) normal (1, 0, 0) x (0, 0, -1)
properties part number "plate"
